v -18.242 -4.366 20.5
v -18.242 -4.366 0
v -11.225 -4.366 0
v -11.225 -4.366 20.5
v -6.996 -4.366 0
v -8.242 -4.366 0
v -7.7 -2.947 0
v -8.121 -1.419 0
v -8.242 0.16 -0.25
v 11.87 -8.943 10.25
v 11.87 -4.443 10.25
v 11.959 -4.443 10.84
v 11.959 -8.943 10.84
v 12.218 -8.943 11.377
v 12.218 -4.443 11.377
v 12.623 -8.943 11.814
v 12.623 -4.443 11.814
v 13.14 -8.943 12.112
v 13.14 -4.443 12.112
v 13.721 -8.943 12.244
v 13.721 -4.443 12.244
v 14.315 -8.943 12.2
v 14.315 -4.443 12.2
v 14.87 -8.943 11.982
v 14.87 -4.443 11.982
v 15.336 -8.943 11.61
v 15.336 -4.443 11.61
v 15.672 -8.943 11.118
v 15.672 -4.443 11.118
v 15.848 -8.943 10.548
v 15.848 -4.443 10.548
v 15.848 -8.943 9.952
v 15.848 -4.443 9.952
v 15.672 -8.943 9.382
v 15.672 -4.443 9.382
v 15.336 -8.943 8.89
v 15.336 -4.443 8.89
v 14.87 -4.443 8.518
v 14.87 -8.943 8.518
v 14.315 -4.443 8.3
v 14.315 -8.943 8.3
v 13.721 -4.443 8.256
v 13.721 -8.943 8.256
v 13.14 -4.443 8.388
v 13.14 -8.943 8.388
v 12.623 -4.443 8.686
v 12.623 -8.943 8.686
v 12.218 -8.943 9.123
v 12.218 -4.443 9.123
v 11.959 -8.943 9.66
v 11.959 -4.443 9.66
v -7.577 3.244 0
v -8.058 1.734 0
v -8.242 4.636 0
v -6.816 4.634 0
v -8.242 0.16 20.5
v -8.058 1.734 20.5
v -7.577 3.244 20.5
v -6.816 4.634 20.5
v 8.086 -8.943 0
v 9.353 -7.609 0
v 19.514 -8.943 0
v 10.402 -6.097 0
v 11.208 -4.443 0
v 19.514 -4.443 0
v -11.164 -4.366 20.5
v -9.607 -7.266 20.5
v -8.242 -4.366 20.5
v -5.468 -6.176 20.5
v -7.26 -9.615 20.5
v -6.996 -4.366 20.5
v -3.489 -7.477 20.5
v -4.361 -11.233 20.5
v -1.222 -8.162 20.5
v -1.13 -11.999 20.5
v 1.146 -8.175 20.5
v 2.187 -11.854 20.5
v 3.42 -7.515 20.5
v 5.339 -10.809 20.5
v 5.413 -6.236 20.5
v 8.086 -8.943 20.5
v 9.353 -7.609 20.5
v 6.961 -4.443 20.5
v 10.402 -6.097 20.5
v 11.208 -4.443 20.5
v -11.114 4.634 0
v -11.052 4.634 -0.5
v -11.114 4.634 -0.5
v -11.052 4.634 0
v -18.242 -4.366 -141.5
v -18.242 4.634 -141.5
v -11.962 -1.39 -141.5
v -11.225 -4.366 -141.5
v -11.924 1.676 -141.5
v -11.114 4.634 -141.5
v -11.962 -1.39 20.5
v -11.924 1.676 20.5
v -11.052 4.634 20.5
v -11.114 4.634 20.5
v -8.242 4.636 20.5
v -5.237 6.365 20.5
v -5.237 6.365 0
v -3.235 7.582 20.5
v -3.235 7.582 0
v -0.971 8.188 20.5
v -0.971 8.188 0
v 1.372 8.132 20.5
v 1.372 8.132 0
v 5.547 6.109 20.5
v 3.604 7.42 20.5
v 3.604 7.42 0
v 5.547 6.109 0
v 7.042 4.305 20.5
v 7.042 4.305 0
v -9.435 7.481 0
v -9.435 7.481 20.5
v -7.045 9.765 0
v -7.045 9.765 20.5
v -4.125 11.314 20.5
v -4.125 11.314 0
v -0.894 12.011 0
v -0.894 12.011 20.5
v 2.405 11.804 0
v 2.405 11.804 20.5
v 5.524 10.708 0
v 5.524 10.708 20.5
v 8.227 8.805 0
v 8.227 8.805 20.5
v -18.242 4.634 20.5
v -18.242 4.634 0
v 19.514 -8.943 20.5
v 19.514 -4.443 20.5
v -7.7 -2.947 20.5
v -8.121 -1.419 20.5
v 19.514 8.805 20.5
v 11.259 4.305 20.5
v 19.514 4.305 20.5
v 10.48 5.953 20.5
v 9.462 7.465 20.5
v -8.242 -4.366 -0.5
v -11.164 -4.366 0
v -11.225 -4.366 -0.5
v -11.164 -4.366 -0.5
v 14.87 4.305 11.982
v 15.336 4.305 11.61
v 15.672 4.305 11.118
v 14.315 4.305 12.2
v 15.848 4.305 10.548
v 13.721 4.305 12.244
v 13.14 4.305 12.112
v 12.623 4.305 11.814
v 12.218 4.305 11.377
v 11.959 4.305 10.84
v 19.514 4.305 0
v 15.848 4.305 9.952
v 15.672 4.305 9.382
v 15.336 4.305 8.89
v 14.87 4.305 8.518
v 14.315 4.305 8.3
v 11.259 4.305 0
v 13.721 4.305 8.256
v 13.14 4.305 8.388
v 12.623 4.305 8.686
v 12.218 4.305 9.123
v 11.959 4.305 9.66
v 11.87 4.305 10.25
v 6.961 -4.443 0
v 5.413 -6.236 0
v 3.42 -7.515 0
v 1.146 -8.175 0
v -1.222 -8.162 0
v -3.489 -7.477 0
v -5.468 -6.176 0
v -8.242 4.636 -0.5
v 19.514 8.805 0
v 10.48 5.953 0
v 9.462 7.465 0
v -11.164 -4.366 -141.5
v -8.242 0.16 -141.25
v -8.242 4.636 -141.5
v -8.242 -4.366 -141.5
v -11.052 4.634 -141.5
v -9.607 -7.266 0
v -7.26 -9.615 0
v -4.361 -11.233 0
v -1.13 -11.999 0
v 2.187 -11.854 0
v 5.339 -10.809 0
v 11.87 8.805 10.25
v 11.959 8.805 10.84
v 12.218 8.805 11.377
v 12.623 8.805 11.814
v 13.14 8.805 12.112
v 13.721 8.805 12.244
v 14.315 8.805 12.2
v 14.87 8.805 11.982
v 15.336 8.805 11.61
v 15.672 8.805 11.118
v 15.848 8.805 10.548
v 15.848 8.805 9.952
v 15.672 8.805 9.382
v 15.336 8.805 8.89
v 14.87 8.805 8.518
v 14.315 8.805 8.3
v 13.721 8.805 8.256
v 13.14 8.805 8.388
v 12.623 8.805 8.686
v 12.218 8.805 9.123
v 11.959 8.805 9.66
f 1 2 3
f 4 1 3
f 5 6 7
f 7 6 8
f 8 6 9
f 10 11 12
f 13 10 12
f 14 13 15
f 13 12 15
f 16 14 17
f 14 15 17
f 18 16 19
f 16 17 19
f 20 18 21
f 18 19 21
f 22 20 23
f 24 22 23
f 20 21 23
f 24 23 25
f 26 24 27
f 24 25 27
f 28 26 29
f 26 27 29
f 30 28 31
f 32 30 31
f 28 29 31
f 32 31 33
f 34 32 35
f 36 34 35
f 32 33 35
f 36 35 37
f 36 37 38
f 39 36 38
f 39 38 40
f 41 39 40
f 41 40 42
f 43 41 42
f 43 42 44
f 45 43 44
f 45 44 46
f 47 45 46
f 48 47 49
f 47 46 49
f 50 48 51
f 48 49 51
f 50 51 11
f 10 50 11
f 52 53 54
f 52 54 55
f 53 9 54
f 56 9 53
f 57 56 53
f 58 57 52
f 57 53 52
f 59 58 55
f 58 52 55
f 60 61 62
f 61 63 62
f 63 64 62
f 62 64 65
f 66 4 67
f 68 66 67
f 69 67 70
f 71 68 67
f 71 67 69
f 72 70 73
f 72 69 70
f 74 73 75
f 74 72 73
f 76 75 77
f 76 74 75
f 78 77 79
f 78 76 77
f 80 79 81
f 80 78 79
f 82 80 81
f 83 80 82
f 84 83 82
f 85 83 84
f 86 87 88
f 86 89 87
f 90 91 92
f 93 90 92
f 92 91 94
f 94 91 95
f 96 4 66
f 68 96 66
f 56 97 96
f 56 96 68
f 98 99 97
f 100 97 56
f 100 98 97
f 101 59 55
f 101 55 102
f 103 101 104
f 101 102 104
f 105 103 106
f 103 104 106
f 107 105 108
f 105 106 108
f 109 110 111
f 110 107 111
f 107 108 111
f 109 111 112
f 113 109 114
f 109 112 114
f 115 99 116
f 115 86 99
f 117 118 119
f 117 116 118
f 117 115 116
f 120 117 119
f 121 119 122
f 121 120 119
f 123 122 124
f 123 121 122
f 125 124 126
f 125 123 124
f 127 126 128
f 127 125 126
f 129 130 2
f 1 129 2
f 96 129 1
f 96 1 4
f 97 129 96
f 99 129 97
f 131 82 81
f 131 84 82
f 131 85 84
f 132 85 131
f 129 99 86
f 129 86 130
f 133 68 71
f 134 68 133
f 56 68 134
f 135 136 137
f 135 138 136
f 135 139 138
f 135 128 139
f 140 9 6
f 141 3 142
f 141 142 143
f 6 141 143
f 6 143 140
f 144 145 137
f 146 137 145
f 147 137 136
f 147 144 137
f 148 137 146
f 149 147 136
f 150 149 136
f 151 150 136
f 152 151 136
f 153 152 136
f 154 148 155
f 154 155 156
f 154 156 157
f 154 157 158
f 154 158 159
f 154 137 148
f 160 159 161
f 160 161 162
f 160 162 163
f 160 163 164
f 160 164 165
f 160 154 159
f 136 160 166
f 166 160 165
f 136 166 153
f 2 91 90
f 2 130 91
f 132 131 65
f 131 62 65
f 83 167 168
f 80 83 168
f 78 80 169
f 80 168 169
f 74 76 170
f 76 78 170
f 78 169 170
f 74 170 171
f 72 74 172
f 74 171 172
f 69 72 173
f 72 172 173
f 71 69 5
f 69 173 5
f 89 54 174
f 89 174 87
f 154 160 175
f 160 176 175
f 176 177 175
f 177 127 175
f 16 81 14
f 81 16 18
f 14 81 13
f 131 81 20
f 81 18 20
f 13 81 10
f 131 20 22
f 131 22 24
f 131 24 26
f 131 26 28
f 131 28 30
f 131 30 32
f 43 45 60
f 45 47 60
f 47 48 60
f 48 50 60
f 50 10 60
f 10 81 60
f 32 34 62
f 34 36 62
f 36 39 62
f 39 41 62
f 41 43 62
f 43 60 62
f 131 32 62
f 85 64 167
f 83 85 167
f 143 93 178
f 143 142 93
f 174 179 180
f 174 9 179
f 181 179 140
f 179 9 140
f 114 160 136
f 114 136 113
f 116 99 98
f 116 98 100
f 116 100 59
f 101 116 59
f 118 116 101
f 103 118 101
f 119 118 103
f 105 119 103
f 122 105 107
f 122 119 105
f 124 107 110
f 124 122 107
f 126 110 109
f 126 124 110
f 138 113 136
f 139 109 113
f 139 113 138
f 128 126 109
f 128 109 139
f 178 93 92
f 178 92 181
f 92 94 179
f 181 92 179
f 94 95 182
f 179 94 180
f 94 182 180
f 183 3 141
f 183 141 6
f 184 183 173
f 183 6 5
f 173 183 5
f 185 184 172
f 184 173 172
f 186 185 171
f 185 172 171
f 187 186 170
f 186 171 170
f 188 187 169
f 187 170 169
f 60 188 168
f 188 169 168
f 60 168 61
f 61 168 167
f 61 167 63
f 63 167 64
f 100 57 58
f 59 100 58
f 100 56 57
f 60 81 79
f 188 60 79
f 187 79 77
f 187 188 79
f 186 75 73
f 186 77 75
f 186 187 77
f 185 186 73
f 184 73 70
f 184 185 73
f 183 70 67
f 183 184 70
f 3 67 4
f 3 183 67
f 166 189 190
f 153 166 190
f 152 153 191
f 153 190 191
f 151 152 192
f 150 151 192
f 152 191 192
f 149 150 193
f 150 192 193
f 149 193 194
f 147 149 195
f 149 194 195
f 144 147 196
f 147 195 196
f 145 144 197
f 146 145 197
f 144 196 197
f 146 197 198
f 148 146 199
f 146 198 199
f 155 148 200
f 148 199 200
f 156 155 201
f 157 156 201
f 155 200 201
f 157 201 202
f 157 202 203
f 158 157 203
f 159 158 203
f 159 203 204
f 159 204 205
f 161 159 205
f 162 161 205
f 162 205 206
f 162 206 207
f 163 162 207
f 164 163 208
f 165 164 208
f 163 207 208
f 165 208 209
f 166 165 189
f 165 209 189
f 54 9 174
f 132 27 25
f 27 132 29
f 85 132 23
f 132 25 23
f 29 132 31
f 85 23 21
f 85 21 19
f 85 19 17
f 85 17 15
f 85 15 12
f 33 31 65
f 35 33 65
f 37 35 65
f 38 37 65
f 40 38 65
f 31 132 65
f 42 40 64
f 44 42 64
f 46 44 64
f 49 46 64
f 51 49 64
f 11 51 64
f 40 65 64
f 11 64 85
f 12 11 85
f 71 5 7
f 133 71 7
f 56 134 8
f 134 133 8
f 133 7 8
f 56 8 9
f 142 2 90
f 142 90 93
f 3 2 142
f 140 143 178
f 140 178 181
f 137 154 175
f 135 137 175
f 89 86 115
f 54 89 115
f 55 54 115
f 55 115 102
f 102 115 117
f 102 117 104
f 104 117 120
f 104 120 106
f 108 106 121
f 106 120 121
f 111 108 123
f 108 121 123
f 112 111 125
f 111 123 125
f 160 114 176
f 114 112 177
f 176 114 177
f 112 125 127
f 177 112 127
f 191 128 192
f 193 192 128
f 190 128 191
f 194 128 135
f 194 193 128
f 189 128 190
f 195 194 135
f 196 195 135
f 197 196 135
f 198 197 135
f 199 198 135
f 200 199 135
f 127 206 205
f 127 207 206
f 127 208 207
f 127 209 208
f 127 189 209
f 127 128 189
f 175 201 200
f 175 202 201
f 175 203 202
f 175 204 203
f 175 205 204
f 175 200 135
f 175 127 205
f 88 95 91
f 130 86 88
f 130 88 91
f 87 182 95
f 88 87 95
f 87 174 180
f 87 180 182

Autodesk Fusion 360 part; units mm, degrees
sketch "Sketch1" plane through (0, 0, 0) normal (0, 0, 1) x (1, 0, 0)
  line L0 (-6.8161, 4.6338) -> (-18.242, 4.6338)
  line L1 (8.001, -8.943) -> (19.5137, -8.943)
  line L2 (19.5137, -8.943) -> (19.5137, -4.443)
  line L3 (-18.242, -4.3662) -> (-6.9956, -4.3662)
  circle A0 centre (0.0069, -0.0041) radius 8.25
  arc A1 (-6.9956, -4.3662) -> (6.9609, -4.443) centre (0.0069, -0.0041) ccw
  line L4 (8.1435, 8.8053) -> (19.5137, 8.8053)
  line L5 (-11.0521, 4.6338) -> (-6.8161, 4.6338)
  line L6 (19.5137, 8.8053) -> (8.1435, 8.8053)
  line L7 (19.5137, -8.943) -> (19.5137, -4.443)
  arc A2 (-6.8161, 4.6338) -> (-6.9956, -4.3662) centre (0.0069, -0.0041) ccw
  line L8 (19.5137, 4.3053) -> (19.5137, 8.8053)
  line L9 (19.5137, 4.3053) -> (7.0419, 4.3053)
  circle A3 centre (0.0069, -0.0041) radius 12.0488
  line L10 (-18.242, 4.6338) -> (-18.242, -4.3662)
  line L11 (8.001, -8.943) -> (19.5137, -8.943)
  line L12 (19.5137, 4.3053) -> (19.5137, 8.8053)
  arc A4 (7.0419, 4.3053) -> (-6.8161, 4.6338) centre (0.0069, -0.0041) ccw
  line L13 (7.0419, 4.3053) -> (19.5137, 4.3053)
  line L14 (19.5137, -4.443) -> (6.9609, -4.443)
  line L15 (-11.0521, 4.6338) -> (-18.242, 4.6338)
  line L16 (-6.9956, -4.3662) -> (-11.1637, -4.3662)
  line L17 (-18.242, -4.3662) -> (-11.1637, -4.3662)
  line L18 (-18.242, 4.6338) -> (-18.242, -4.3662)
  line L19 (0.0069, -0.0041) -> (-18.242, -0.0041) construction
  line L20 (-8.2415, 0.1604) -> (-8.2415, -4.3662)
  line L21 (-8.2415, 0.1604) -> (-8.2415, 4.6355)
  line L22 (-8.2415, -4.3662) -> (-8.2415, 4.6355)
  dimension "d6" = 90
extrude "Extrude1" add sketch "Sketch1" along normal blind 20.5 contours L0 A0 L5 A2 L21 L22 | L0 A0 L5 L9 A3 A4 L13 L15 | L3 A0 A2 L16 L20 L22 | L0 L3 L5 A3 L15 L16 L17 L20 L21 L22 | L4 L6 L8 L9 A3 L12 L13 | L3 A0 A1 A3 L14 L16 L17 | L0 L3 A3 L10 L15 L17 L18 | L1 L2 L7 A3 L11 L14
sketch "Sketch2" plane through (0, 8.8053, 0) normal (0, 1, 0) x (-1, 0, 0)
  line L0 (-19.5137, 0) -> (-8.2268, 0)
  line L1 (-8.2268, 20.5) -> (-19.5137, 20.5)
  line L2 (-19.5137, 20.5) -> (-19.5137, 0)
  line L3 (-8.2268, 0) -> (-19.5137, 20.5) construction
  line L4 (-8.2268, 20.5) -> (-19.5137, 0) construction
  circle A0 centre (-13.8702, 10.25) radius 2
  line L5 (-8.2268, 0) -> (-8.2268, 20.5)
  dimension "d3" = 4
extrude "Extrude2" cut sketch "Sketch2" against normal blind 39 contours A0
extrude "Extrude3" add sketch "Sketch1" against normal blind 141.5 contours L0 L3 L5 A3 L15 L16 L17 L20 L21 L22 | L0 L3 A3 L10 L15 L17 L18
extrude "Extrude4" cut sketch "Sketch1" against normal blind 144 contours L0 A0 L5 A2 L21 L22 | L3 A0 A2 L16 L20 L22
extrude "Extrude5" cut 1 faces at (-9.3904, -2.3691, -141.5) along direction (0, 0, 1) blind 141
extrude "Extrude6" add 1 faces at (-9.3904, -2.3691, -0.5) along direction (0, 0, -1) blind 141
